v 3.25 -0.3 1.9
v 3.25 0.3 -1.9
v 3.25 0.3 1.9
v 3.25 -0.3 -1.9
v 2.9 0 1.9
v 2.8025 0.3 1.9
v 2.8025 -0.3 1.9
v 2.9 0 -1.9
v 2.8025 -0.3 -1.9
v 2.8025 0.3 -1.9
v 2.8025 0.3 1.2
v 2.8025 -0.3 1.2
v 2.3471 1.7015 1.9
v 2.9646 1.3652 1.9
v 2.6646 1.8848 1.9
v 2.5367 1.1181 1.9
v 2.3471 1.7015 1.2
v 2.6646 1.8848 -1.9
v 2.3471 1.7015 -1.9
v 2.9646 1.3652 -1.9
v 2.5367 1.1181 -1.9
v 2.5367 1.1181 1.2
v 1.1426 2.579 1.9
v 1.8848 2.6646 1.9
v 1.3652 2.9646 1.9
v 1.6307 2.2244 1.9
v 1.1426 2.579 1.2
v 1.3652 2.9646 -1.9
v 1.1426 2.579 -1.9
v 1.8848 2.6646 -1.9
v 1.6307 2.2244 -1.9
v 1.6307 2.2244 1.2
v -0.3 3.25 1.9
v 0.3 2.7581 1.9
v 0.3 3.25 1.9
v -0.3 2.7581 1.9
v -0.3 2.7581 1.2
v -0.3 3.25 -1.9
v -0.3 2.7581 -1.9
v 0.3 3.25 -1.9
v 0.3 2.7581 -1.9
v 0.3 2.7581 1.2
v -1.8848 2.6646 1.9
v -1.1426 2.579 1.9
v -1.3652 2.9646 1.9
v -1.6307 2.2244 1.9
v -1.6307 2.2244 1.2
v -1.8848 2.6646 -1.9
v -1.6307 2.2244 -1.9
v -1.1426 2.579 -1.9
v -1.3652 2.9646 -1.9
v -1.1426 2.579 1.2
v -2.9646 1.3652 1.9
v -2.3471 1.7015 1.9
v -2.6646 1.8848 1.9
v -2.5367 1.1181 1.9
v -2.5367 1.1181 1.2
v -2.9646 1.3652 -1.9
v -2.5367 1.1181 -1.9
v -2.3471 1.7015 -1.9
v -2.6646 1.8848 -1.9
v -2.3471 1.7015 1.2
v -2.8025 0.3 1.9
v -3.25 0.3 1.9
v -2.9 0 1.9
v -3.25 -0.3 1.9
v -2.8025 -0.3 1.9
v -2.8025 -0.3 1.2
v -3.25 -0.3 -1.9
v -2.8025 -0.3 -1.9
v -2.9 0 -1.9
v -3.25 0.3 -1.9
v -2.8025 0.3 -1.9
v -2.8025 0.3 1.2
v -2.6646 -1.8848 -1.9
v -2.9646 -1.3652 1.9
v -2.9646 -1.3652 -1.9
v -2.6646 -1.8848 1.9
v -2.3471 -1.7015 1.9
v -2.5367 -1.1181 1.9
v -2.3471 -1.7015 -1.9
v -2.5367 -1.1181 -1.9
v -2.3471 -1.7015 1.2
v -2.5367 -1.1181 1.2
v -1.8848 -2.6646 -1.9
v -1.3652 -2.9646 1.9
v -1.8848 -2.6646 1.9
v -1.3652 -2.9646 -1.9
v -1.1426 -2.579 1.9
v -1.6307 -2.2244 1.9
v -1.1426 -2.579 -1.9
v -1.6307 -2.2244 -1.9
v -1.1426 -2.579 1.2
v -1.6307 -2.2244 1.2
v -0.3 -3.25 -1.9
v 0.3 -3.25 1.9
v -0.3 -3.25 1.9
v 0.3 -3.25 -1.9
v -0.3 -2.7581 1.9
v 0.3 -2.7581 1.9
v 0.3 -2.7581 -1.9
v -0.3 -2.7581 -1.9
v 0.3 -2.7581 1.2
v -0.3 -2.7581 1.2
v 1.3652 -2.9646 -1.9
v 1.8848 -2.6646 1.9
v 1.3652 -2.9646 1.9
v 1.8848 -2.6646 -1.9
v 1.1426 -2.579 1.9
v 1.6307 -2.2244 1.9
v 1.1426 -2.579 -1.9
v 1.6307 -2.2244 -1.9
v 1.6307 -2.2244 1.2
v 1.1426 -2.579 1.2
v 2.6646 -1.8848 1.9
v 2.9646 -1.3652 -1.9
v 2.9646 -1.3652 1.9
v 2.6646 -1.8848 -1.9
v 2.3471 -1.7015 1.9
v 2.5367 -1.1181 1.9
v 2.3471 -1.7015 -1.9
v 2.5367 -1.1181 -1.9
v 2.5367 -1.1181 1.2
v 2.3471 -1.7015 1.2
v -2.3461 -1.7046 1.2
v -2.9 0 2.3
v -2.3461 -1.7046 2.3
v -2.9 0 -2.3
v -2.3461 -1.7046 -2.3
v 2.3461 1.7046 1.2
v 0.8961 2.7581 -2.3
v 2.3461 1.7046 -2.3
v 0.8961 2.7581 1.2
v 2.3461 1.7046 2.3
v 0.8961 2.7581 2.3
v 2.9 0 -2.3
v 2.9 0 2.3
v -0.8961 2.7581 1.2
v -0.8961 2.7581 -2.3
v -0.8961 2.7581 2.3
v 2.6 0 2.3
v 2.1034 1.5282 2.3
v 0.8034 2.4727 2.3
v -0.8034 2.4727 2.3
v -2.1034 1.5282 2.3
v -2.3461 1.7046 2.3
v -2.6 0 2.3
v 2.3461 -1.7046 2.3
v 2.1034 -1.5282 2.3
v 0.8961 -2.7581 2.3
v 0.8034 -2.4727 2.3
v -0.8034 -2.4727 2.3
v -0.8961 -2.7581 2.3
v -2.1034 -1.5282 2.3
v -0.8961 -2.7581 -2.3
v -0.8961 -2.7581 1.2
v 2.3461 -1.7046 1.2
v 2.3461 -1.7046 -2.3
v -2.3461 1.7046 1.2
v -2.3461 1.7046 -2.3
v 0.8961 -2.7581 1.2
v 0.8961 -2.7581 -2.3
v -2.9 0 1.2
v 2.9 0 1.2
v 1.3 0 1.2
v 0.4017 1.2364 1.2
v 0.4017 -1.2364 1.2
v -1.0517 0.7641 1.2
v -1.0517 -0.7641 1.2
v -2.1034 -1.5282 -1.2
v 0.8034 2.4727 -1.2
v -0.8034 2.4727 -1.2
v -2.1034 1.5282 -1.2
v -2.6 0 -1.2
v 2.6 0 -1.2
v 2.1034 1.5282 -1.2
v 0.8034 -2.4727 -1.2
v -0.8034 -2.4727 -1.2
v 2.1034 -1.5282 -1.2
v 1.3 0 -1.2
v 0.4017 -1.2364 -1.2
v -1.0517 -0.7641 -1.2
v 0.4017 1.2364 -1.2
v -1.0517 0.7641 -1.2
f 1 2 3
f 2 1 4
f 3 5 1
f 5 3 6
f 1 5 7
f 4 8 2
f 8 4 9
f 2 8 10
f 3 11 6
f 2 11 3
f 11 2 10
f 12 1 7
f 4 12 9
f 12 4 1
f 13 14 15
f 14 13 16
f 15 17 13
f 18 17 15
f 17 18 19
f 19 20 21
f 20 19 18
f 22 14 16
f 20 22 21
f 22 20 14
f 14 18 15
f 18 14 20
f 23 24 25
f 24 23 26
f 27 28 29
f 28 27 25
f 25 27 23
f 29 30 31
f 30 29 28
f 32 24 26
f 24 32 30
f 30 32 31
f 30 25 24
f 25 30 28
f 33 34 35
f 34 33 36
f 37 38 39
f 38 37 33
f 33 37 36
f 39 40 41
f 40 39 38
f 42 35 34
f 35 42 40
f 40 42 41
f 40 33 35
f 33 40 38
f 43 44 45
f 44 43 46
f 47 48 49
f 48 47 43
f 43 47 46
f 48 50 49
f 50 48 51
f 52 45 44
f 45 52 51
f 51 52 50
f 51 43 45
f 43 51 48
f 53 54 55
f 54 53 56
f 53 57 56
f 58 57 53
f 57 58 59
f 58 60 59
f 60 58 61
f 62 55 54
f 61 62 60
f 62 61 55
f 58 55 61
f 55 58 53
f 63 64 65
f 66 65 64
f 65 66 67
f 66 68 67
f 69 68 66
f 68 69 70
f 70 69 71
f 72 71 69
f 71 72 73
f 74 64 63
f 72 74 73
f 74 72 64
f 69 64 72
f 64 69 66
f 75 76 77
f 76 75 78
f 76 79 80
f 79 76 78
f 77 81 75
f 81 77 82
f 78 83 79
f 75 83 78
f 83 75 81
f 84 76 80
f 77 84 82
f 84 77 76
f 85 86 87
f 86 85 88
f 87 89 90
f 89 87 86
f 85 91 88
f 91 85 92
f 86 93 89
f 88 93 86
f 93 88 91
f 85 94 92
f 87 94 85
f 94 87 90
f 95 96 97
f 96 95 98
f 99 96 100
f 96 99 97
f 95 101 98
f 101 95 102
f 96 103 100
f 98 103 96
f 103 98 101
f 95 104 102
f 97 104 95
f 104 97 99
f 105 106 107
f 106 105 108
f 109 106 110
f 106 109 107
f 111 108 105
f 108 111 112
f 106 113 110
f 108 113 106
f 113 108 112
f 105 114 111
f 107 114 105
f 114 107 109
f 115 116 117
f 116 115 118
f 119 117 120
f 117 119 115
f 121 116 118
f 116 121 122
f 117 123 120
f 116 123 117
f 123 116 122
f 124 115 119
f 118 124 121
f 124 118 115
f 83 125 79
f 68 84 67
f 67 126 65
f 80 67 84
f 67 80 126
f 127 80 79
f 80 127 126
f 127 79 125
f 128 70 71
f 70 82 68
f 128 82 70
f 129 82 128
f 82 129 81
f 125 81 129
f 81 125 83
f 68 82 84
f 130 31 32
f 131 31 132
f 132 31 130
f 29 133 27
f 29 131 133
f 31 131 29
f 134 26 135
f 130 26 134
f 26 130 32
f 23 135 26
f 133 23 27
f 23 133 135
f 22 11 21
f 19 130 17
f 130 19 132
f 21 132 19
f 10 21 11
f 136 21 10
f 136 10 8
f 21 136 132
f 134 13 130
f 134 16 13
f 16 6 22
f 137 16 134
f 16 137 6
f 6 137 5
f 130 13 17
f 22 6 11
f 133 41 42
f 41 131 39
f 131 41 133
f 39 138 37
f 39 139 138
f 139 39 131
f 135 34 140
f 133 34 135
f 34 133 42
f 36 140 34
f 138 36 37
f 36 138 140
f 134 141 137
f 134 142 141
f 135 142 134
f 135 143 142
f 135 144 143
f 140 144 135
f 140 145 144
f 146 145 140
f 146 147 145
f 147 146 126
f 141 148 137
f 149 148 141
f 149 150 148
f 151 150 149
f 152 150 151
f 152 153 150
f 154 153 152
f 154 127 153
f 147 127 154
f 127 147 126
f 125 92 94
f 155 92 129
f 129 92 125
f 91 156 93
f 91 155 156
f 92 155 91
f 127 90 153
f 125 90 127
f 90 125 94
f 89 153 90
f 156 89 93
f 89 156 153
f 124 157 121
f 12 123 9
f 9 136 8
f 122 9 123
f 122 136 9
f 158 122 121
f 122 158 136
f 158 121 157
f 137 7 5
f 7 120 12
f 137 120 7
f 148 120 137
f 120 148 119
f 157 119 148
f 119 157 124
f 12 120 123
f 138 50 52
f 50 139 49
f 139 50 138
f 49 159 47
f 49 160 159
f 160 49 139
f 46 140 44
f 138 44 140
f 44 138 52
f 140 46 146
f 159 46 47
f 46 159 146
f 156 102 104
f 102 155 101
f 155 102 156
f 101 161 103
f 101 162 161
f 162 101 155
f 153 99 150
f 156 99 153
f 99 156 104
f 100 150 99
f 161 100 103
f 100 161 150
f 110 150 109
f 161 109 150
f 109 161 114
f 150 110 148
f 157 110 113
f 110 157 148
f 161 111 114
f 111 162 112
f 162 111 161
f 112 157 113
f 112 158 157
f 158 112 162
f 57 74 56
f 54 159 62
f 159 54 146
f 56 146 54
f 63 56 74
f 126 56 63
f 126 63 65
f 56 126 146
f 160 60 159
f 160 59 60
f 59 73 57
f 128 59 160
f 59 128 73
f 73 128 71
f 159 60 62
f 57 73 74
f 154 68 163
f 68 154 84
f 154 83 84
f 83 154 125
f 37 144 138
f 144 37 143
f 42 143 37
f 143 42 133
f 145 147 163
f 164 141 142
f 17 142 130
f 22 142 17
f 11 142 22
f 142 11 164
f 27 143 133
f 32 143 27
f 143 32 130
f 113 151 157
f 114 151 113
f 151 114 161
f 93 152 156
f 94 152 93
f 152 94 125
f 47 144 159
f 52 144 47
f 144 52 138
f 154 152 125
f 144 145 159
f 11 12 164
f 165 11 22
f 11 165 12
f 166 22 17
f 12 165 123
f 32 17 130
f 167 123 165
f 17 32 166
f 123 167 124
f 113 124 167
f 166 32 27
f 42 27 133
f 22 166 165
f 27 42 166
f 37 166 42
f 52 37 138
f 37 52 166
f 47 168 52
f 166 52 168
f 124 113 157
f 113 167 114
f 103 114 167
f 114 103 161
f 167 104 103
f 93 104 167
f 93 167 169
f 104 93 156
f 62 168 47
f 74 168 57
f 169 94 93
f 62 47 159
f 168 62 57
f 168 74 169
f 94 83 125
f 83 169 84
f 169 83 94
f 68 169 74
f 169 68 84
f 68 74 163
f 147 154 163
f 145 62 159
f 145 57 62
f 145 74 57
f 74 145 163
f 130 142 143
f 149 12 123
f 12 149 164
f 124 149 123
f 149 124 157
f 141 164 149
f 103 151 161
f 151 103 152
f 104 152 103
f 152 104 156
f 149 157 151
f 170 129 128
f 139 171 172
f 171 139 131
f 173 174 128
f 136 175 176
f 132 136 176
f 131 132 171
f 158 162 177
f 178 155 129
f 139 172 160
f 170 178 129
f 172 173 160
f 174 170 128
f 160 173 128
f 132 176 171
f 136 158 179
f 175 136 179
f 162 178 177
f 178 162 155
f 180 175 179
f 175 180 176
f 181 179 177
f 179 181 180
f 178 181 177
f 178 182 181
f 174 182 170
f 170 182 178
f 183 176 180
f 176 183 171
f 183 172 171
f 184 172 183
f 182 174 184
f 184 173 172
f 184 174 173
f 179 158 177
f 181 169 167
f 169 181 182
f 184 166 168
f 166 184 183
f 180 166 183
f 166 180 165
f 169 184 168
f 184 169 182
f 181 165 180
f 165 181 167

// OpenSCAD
// Parameters
outer_diameter = 5.8; //[2.9:11.6:0.1]
length = 4.6; //[2.3:9.2:0.1]
screw_diameter = 3; //[1.5:6:0.1]
internal_thread_pitch = 0.5; //[0.25:1:0.05]
internal_bore_diameter = 2.6; //[2.2:3.2:0.05]
lead_in_chamfer_height = 0.3; //[0.15:0.8:0.05]
lead_in_chamfer_angle_deg = 45; //[20:70:1]
end_chamfer_height = 0.3; //[0.15:0.8:0.05]
end_chamfer_angle_deg = 45; //[20:70:1]
rib_count = 12; //[6:24:1]
rib_radial_height = 0.35; //[0.15:0.8:0.05]
rib_tangential_width = 0.6; //[0.3:1.2:0.05]
rib_length_margin = 0.4; //[0.2:1:0.05]
overlap = 0.8; //[0.5:2:0.1]

// Threaded Insert - complete geometry
module threaded_insert() {
  color([0.8, 0.6, 0.2]) { // Brass color
    difference() {
      union() {
        // Main body
        cylinder(r=outer_diameter/2, h=length, center=true);
        
        // Ribs
        for (i = [0:rib_count-1]) {
          rotate([0, 0, i*360/rib_count])
          translate([outer_diameter/2 + (rib_radial_height + overlap)/2 - overlap, 0, 0])
          cube([rib_radial_height + overlap, rib_tangential_width, length - 2*rib_length_margin], center=true);
        }
      }
      
      // Lead-in chamfer
      translate([0, 0, length/2 - (lead_in_chamfer_height + overlap)/2])
      cylinder(r1=outer_diameter/2, r2=outer_diameter/2 - lead_in_chamfer_height, h=lead_in_chamfer_height + overlap, center=true);
      
      // Installation end chamfer
      translate([0, 0, -length/2 + (end_chamfer_height + overlap)/2])
      cylinder(r1=outer_diameter/2, r2=outer_diameter/2 - end_chamfer_height, h=end_chamfer_height + overlap, center=true);
      
      // Internal thread bore
      cylinder(r=internal_bore_diameter/2, h=length + 2*overlap, center=true);
    }
  }
}

// Assembly
module assembly() {
  threaded_insert();
}

assembly();
